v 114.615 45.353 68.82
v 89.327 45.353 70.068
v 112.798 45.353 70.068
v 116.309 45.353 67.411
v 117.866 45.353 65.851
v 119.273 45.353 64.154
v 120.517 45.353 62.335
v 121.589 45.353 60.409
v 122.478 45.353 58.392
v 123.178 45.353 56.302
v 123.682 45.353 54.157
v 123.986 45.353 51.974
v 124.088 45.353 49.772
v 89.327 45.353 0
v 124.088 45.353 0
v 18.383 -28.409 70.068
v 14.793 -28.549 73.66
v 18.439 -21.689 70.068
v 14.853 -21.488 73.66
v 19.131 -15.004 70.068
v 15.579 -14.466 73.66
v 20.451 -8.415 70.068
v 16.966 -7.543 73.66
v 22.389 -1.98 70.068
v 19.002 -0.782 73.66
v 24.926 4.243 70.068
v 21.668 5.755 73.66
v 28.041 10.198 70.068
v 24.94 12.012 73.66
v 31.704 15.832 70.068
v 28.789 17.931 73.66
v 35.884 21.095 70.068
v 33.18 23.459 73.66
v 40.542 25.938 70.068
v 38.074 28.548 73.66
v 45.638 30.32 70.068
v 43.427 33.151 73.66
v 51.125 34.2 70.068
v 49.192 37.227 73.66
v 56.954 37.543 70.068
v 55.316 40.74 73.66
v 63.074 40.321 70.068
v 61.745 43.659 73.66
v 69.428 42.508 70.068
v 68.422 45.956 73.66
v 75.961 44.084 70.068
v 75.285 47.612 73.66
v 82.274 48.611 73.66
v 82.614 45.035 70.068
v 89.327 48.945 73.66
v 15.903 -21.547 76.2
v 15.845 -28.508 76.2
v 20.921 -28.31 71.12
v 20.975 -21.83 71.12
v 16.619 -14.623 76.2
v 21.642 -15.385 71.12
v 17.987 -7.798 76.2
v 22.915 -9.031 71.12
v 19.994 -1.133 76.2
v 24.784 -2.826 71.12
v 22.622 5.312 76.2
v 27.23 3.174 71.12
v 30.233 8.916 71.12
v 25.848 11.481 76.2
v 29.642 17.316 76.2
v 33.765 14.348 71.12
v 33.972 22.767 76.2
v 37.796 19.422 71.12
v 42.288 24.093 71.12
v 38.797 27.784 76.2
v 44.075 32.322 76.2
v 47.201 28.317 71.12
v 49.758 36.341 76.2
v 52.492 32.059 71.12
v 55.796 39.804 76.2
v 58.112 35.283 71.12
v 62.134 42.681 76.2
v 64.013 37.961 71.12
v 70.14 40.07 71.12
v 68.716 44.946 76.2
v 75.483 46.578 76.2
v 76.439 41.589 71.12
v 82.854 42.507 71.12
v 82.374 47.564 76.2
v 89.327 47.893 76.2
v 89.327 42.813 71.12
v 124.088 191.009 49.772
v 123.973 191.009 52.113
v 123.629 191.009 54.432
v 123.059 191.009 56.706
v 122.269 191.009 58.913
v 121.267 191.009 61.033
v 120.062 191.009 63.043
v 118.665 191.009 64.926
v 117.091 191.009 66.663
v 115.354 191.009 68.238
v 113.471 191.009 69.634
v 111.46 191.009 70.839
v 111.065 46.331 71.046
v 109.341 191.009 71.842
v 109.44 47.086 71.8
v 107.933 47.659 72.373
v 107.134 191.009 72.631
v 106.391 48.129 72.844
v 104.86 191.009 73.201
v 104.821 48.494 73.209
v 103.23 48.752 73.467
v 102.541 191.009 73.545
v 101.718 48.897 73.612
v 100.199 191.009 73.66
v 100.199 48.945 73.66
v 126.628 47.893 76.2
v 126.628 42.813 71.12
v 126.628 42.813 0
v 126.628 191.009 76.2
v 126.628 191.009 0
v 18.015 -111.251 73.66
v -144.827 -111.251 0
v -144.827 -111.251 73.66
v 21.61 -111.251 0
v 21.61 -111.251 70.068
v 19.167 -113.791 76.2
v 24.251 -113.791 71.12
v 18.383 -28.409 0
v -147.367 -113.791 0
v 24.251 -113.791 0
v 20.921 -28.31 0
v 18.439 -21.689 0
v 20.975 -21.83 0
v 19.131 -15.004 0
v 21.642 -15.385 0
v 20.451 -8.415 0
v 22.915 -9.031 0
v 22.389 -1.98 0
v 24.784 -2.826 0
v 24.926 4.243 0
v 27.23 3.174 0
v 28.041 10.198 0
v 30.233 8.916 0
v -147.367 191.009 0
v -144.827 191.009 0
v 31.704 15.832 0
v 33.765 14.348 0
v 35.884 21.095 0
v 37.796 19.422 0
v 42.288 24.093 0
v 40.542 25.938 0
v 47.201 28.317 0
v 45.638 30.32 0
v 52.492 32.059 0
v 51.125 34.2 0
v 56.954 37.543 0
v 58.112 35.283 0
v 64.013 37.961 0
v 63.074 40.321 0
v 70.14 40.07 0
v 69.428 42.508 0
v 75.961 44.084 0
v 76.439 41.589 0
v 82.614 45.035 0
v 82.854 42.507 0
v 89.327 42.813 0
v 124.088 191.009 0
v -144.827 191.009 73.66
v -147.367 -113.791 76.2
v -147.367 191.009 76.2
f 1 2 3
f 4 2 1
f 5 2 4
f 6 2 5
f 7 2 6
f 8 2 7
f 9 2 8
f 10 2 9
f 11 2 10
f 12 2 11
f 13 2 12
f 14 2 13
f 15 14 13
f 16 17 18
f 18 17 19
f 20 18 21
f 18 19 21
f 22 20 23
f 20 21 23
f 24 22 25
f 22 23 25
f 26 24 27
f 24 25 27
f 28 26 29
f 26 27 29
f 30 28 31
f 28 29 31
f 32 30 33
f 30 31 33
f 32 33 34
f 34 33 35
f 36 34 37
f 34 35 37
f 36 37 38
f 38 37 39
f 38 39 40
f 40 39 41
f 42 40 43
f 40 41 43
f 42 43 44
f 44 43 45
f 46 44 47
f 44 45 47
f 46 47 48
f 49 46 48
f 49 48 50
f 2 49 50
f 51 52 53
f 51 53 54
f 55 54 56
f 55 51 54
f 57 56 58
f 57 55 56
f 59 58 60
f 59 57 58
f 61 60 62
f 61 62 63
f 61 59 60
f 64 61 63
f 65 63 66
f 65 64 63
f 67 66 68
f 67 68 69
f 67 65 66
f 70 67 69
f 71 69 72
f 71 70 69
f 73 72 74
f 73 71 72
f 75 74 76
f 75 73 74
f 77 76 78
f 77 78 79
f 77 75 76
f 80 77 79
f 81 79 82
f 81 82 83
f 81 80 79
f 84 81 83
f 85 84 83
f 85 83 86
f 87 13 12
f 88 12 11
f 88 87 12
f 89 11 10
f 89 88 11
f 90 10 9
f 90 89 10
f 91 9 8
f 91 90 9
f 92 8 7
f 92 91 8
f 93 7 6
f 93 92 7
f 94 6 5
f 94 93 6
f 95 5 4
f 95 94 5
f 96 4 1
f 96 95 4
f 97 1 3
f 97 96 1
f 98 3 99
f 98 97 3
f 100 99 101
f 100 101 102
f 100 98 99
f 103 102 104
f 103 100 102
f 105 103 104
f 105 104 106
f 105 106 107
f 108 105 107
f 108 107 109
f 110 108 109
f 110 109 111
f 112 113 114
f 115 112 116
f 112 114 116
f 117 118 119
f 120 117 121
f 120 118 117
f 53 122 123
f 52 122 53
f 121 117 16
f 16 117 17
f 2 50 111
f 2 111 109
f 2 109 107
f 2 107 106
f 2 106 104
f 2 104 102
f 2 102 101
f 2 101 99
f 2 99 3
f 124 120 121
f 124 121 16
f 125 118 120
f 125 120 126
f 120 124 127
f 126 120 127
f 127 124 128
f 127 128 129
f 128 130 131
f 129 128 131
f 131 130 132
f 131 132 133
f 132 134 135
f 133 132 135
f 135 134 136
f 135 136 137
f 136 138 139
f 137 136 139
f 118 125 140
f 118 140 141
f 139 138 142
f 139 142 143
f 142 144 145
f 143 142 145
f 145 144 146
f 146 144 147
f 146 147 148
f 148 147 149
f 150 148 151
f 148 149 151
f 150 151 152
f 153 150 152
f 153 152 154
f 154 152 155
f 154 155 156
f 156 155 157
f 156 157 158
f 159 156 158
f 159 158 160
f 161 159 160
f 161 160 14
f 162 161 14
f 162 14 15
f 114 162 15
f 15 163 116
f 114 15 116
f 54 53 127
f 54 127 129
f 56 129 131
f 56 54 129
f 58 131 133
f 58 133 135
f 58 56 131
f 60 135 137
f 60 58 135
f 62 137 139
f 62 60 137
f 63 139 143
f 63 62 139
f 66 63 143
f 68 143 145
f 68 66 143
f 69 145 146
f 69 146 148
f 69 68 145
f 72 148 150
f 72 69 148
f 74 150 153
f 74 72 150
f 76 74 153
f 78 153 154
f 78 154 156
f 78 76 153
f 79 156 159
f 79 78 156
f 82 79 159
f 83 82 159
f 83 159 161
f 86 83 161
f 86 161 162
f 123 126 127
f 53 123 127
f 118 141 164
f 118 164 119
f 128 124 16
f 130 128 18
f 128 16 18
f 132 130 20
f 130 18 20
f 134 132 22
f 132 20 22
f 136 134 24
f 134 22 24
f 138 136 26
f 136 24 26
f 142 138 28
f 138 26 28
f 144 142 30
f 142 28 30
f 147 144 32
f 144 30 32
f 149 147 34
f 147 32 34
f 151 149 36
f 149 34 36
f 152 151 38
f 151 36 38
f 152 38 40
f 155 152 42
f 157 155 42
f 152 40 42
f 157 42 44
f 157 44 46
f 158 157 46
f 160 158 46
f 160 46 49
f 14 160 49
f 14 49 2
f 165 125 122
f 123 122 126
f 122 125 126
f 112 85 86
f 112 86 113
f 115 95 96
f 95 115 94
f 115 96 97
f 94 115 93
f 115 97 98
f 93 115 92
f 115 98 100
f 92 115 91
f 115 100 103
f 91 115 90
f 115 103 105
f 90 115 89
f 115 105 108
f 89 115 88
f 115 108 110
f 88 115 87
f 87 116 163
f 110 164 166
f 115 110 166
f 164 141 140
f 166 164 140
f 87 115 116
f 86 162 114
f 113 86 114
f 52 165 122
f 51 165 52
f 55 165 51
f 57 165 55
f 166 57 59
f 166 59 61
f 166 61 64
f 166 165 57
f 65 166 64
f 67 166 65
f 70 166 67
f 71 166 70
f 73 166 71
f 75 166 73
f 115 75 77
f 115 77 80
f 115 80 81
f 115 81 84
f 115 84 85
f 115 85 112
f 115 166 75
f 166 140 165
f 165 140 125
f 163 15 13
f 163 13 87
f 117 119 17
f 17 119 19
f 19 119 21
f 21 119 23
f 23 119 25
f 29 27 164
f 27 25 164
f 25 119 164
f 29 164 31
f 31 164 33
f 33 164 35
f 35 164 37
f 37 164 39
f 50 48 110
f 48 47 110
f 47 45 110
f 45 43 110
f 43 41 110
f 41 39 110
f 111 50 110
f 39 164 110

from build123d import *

# Parameters (mm, degrees)
F1_DEPTH = 76.2
F2_R     = 68.4578192755
F3_SIZE  = 5.08
F4_T     = -2.54
F5_R     = 23.8881657529


with BuildPart() as f1:
    # F0 (on Top) → F1 (new body)
    with BuildSketch(Plane.XY):
        Polygon((-147.3665168505, 191.0085547507), (-147.3665168505, -113.7914452493), (24.251197043, -113.7914452493), (18.1496212227, 42.8132099656), (126.6276255479, 42.8132099656), (126.6276255479, 191.0085547507), align=None)
    extrude(amount=F1_DEPTH)

    # F2
    f2_edges = [f1.edges().sort_by_distance(p)[0] for p in [
        (18.149621, 42.81321, 38.1),
    ]]
    fillet(f2_edges, radius=F2_R)

    # F3
    f3_edges = [f1.edges().sort_by_distance(p)[0] for p in [
        (22.585944, -71.050631, 76.2),
    ]]
    chamfer(f3_edges, length=F3_SIZE)

    # F4
    f4_openings = [f1.faces().sort_by_distance(p)[0] for p in [
        (-30.069357, 56.198689, 0),
        (-10.369446, 191.008555, 38.1),
    ]]
    offset(amount=F4_T, openings=f4_openings)

    # F5
    f5_edges = [f1.edges().sort_by_distance(p)[0] for p in [
        (124.087626, 119.976934, 73.66),
    ]]
    fillet(f5_edges, radius=F5_R)


solid = f1.part
